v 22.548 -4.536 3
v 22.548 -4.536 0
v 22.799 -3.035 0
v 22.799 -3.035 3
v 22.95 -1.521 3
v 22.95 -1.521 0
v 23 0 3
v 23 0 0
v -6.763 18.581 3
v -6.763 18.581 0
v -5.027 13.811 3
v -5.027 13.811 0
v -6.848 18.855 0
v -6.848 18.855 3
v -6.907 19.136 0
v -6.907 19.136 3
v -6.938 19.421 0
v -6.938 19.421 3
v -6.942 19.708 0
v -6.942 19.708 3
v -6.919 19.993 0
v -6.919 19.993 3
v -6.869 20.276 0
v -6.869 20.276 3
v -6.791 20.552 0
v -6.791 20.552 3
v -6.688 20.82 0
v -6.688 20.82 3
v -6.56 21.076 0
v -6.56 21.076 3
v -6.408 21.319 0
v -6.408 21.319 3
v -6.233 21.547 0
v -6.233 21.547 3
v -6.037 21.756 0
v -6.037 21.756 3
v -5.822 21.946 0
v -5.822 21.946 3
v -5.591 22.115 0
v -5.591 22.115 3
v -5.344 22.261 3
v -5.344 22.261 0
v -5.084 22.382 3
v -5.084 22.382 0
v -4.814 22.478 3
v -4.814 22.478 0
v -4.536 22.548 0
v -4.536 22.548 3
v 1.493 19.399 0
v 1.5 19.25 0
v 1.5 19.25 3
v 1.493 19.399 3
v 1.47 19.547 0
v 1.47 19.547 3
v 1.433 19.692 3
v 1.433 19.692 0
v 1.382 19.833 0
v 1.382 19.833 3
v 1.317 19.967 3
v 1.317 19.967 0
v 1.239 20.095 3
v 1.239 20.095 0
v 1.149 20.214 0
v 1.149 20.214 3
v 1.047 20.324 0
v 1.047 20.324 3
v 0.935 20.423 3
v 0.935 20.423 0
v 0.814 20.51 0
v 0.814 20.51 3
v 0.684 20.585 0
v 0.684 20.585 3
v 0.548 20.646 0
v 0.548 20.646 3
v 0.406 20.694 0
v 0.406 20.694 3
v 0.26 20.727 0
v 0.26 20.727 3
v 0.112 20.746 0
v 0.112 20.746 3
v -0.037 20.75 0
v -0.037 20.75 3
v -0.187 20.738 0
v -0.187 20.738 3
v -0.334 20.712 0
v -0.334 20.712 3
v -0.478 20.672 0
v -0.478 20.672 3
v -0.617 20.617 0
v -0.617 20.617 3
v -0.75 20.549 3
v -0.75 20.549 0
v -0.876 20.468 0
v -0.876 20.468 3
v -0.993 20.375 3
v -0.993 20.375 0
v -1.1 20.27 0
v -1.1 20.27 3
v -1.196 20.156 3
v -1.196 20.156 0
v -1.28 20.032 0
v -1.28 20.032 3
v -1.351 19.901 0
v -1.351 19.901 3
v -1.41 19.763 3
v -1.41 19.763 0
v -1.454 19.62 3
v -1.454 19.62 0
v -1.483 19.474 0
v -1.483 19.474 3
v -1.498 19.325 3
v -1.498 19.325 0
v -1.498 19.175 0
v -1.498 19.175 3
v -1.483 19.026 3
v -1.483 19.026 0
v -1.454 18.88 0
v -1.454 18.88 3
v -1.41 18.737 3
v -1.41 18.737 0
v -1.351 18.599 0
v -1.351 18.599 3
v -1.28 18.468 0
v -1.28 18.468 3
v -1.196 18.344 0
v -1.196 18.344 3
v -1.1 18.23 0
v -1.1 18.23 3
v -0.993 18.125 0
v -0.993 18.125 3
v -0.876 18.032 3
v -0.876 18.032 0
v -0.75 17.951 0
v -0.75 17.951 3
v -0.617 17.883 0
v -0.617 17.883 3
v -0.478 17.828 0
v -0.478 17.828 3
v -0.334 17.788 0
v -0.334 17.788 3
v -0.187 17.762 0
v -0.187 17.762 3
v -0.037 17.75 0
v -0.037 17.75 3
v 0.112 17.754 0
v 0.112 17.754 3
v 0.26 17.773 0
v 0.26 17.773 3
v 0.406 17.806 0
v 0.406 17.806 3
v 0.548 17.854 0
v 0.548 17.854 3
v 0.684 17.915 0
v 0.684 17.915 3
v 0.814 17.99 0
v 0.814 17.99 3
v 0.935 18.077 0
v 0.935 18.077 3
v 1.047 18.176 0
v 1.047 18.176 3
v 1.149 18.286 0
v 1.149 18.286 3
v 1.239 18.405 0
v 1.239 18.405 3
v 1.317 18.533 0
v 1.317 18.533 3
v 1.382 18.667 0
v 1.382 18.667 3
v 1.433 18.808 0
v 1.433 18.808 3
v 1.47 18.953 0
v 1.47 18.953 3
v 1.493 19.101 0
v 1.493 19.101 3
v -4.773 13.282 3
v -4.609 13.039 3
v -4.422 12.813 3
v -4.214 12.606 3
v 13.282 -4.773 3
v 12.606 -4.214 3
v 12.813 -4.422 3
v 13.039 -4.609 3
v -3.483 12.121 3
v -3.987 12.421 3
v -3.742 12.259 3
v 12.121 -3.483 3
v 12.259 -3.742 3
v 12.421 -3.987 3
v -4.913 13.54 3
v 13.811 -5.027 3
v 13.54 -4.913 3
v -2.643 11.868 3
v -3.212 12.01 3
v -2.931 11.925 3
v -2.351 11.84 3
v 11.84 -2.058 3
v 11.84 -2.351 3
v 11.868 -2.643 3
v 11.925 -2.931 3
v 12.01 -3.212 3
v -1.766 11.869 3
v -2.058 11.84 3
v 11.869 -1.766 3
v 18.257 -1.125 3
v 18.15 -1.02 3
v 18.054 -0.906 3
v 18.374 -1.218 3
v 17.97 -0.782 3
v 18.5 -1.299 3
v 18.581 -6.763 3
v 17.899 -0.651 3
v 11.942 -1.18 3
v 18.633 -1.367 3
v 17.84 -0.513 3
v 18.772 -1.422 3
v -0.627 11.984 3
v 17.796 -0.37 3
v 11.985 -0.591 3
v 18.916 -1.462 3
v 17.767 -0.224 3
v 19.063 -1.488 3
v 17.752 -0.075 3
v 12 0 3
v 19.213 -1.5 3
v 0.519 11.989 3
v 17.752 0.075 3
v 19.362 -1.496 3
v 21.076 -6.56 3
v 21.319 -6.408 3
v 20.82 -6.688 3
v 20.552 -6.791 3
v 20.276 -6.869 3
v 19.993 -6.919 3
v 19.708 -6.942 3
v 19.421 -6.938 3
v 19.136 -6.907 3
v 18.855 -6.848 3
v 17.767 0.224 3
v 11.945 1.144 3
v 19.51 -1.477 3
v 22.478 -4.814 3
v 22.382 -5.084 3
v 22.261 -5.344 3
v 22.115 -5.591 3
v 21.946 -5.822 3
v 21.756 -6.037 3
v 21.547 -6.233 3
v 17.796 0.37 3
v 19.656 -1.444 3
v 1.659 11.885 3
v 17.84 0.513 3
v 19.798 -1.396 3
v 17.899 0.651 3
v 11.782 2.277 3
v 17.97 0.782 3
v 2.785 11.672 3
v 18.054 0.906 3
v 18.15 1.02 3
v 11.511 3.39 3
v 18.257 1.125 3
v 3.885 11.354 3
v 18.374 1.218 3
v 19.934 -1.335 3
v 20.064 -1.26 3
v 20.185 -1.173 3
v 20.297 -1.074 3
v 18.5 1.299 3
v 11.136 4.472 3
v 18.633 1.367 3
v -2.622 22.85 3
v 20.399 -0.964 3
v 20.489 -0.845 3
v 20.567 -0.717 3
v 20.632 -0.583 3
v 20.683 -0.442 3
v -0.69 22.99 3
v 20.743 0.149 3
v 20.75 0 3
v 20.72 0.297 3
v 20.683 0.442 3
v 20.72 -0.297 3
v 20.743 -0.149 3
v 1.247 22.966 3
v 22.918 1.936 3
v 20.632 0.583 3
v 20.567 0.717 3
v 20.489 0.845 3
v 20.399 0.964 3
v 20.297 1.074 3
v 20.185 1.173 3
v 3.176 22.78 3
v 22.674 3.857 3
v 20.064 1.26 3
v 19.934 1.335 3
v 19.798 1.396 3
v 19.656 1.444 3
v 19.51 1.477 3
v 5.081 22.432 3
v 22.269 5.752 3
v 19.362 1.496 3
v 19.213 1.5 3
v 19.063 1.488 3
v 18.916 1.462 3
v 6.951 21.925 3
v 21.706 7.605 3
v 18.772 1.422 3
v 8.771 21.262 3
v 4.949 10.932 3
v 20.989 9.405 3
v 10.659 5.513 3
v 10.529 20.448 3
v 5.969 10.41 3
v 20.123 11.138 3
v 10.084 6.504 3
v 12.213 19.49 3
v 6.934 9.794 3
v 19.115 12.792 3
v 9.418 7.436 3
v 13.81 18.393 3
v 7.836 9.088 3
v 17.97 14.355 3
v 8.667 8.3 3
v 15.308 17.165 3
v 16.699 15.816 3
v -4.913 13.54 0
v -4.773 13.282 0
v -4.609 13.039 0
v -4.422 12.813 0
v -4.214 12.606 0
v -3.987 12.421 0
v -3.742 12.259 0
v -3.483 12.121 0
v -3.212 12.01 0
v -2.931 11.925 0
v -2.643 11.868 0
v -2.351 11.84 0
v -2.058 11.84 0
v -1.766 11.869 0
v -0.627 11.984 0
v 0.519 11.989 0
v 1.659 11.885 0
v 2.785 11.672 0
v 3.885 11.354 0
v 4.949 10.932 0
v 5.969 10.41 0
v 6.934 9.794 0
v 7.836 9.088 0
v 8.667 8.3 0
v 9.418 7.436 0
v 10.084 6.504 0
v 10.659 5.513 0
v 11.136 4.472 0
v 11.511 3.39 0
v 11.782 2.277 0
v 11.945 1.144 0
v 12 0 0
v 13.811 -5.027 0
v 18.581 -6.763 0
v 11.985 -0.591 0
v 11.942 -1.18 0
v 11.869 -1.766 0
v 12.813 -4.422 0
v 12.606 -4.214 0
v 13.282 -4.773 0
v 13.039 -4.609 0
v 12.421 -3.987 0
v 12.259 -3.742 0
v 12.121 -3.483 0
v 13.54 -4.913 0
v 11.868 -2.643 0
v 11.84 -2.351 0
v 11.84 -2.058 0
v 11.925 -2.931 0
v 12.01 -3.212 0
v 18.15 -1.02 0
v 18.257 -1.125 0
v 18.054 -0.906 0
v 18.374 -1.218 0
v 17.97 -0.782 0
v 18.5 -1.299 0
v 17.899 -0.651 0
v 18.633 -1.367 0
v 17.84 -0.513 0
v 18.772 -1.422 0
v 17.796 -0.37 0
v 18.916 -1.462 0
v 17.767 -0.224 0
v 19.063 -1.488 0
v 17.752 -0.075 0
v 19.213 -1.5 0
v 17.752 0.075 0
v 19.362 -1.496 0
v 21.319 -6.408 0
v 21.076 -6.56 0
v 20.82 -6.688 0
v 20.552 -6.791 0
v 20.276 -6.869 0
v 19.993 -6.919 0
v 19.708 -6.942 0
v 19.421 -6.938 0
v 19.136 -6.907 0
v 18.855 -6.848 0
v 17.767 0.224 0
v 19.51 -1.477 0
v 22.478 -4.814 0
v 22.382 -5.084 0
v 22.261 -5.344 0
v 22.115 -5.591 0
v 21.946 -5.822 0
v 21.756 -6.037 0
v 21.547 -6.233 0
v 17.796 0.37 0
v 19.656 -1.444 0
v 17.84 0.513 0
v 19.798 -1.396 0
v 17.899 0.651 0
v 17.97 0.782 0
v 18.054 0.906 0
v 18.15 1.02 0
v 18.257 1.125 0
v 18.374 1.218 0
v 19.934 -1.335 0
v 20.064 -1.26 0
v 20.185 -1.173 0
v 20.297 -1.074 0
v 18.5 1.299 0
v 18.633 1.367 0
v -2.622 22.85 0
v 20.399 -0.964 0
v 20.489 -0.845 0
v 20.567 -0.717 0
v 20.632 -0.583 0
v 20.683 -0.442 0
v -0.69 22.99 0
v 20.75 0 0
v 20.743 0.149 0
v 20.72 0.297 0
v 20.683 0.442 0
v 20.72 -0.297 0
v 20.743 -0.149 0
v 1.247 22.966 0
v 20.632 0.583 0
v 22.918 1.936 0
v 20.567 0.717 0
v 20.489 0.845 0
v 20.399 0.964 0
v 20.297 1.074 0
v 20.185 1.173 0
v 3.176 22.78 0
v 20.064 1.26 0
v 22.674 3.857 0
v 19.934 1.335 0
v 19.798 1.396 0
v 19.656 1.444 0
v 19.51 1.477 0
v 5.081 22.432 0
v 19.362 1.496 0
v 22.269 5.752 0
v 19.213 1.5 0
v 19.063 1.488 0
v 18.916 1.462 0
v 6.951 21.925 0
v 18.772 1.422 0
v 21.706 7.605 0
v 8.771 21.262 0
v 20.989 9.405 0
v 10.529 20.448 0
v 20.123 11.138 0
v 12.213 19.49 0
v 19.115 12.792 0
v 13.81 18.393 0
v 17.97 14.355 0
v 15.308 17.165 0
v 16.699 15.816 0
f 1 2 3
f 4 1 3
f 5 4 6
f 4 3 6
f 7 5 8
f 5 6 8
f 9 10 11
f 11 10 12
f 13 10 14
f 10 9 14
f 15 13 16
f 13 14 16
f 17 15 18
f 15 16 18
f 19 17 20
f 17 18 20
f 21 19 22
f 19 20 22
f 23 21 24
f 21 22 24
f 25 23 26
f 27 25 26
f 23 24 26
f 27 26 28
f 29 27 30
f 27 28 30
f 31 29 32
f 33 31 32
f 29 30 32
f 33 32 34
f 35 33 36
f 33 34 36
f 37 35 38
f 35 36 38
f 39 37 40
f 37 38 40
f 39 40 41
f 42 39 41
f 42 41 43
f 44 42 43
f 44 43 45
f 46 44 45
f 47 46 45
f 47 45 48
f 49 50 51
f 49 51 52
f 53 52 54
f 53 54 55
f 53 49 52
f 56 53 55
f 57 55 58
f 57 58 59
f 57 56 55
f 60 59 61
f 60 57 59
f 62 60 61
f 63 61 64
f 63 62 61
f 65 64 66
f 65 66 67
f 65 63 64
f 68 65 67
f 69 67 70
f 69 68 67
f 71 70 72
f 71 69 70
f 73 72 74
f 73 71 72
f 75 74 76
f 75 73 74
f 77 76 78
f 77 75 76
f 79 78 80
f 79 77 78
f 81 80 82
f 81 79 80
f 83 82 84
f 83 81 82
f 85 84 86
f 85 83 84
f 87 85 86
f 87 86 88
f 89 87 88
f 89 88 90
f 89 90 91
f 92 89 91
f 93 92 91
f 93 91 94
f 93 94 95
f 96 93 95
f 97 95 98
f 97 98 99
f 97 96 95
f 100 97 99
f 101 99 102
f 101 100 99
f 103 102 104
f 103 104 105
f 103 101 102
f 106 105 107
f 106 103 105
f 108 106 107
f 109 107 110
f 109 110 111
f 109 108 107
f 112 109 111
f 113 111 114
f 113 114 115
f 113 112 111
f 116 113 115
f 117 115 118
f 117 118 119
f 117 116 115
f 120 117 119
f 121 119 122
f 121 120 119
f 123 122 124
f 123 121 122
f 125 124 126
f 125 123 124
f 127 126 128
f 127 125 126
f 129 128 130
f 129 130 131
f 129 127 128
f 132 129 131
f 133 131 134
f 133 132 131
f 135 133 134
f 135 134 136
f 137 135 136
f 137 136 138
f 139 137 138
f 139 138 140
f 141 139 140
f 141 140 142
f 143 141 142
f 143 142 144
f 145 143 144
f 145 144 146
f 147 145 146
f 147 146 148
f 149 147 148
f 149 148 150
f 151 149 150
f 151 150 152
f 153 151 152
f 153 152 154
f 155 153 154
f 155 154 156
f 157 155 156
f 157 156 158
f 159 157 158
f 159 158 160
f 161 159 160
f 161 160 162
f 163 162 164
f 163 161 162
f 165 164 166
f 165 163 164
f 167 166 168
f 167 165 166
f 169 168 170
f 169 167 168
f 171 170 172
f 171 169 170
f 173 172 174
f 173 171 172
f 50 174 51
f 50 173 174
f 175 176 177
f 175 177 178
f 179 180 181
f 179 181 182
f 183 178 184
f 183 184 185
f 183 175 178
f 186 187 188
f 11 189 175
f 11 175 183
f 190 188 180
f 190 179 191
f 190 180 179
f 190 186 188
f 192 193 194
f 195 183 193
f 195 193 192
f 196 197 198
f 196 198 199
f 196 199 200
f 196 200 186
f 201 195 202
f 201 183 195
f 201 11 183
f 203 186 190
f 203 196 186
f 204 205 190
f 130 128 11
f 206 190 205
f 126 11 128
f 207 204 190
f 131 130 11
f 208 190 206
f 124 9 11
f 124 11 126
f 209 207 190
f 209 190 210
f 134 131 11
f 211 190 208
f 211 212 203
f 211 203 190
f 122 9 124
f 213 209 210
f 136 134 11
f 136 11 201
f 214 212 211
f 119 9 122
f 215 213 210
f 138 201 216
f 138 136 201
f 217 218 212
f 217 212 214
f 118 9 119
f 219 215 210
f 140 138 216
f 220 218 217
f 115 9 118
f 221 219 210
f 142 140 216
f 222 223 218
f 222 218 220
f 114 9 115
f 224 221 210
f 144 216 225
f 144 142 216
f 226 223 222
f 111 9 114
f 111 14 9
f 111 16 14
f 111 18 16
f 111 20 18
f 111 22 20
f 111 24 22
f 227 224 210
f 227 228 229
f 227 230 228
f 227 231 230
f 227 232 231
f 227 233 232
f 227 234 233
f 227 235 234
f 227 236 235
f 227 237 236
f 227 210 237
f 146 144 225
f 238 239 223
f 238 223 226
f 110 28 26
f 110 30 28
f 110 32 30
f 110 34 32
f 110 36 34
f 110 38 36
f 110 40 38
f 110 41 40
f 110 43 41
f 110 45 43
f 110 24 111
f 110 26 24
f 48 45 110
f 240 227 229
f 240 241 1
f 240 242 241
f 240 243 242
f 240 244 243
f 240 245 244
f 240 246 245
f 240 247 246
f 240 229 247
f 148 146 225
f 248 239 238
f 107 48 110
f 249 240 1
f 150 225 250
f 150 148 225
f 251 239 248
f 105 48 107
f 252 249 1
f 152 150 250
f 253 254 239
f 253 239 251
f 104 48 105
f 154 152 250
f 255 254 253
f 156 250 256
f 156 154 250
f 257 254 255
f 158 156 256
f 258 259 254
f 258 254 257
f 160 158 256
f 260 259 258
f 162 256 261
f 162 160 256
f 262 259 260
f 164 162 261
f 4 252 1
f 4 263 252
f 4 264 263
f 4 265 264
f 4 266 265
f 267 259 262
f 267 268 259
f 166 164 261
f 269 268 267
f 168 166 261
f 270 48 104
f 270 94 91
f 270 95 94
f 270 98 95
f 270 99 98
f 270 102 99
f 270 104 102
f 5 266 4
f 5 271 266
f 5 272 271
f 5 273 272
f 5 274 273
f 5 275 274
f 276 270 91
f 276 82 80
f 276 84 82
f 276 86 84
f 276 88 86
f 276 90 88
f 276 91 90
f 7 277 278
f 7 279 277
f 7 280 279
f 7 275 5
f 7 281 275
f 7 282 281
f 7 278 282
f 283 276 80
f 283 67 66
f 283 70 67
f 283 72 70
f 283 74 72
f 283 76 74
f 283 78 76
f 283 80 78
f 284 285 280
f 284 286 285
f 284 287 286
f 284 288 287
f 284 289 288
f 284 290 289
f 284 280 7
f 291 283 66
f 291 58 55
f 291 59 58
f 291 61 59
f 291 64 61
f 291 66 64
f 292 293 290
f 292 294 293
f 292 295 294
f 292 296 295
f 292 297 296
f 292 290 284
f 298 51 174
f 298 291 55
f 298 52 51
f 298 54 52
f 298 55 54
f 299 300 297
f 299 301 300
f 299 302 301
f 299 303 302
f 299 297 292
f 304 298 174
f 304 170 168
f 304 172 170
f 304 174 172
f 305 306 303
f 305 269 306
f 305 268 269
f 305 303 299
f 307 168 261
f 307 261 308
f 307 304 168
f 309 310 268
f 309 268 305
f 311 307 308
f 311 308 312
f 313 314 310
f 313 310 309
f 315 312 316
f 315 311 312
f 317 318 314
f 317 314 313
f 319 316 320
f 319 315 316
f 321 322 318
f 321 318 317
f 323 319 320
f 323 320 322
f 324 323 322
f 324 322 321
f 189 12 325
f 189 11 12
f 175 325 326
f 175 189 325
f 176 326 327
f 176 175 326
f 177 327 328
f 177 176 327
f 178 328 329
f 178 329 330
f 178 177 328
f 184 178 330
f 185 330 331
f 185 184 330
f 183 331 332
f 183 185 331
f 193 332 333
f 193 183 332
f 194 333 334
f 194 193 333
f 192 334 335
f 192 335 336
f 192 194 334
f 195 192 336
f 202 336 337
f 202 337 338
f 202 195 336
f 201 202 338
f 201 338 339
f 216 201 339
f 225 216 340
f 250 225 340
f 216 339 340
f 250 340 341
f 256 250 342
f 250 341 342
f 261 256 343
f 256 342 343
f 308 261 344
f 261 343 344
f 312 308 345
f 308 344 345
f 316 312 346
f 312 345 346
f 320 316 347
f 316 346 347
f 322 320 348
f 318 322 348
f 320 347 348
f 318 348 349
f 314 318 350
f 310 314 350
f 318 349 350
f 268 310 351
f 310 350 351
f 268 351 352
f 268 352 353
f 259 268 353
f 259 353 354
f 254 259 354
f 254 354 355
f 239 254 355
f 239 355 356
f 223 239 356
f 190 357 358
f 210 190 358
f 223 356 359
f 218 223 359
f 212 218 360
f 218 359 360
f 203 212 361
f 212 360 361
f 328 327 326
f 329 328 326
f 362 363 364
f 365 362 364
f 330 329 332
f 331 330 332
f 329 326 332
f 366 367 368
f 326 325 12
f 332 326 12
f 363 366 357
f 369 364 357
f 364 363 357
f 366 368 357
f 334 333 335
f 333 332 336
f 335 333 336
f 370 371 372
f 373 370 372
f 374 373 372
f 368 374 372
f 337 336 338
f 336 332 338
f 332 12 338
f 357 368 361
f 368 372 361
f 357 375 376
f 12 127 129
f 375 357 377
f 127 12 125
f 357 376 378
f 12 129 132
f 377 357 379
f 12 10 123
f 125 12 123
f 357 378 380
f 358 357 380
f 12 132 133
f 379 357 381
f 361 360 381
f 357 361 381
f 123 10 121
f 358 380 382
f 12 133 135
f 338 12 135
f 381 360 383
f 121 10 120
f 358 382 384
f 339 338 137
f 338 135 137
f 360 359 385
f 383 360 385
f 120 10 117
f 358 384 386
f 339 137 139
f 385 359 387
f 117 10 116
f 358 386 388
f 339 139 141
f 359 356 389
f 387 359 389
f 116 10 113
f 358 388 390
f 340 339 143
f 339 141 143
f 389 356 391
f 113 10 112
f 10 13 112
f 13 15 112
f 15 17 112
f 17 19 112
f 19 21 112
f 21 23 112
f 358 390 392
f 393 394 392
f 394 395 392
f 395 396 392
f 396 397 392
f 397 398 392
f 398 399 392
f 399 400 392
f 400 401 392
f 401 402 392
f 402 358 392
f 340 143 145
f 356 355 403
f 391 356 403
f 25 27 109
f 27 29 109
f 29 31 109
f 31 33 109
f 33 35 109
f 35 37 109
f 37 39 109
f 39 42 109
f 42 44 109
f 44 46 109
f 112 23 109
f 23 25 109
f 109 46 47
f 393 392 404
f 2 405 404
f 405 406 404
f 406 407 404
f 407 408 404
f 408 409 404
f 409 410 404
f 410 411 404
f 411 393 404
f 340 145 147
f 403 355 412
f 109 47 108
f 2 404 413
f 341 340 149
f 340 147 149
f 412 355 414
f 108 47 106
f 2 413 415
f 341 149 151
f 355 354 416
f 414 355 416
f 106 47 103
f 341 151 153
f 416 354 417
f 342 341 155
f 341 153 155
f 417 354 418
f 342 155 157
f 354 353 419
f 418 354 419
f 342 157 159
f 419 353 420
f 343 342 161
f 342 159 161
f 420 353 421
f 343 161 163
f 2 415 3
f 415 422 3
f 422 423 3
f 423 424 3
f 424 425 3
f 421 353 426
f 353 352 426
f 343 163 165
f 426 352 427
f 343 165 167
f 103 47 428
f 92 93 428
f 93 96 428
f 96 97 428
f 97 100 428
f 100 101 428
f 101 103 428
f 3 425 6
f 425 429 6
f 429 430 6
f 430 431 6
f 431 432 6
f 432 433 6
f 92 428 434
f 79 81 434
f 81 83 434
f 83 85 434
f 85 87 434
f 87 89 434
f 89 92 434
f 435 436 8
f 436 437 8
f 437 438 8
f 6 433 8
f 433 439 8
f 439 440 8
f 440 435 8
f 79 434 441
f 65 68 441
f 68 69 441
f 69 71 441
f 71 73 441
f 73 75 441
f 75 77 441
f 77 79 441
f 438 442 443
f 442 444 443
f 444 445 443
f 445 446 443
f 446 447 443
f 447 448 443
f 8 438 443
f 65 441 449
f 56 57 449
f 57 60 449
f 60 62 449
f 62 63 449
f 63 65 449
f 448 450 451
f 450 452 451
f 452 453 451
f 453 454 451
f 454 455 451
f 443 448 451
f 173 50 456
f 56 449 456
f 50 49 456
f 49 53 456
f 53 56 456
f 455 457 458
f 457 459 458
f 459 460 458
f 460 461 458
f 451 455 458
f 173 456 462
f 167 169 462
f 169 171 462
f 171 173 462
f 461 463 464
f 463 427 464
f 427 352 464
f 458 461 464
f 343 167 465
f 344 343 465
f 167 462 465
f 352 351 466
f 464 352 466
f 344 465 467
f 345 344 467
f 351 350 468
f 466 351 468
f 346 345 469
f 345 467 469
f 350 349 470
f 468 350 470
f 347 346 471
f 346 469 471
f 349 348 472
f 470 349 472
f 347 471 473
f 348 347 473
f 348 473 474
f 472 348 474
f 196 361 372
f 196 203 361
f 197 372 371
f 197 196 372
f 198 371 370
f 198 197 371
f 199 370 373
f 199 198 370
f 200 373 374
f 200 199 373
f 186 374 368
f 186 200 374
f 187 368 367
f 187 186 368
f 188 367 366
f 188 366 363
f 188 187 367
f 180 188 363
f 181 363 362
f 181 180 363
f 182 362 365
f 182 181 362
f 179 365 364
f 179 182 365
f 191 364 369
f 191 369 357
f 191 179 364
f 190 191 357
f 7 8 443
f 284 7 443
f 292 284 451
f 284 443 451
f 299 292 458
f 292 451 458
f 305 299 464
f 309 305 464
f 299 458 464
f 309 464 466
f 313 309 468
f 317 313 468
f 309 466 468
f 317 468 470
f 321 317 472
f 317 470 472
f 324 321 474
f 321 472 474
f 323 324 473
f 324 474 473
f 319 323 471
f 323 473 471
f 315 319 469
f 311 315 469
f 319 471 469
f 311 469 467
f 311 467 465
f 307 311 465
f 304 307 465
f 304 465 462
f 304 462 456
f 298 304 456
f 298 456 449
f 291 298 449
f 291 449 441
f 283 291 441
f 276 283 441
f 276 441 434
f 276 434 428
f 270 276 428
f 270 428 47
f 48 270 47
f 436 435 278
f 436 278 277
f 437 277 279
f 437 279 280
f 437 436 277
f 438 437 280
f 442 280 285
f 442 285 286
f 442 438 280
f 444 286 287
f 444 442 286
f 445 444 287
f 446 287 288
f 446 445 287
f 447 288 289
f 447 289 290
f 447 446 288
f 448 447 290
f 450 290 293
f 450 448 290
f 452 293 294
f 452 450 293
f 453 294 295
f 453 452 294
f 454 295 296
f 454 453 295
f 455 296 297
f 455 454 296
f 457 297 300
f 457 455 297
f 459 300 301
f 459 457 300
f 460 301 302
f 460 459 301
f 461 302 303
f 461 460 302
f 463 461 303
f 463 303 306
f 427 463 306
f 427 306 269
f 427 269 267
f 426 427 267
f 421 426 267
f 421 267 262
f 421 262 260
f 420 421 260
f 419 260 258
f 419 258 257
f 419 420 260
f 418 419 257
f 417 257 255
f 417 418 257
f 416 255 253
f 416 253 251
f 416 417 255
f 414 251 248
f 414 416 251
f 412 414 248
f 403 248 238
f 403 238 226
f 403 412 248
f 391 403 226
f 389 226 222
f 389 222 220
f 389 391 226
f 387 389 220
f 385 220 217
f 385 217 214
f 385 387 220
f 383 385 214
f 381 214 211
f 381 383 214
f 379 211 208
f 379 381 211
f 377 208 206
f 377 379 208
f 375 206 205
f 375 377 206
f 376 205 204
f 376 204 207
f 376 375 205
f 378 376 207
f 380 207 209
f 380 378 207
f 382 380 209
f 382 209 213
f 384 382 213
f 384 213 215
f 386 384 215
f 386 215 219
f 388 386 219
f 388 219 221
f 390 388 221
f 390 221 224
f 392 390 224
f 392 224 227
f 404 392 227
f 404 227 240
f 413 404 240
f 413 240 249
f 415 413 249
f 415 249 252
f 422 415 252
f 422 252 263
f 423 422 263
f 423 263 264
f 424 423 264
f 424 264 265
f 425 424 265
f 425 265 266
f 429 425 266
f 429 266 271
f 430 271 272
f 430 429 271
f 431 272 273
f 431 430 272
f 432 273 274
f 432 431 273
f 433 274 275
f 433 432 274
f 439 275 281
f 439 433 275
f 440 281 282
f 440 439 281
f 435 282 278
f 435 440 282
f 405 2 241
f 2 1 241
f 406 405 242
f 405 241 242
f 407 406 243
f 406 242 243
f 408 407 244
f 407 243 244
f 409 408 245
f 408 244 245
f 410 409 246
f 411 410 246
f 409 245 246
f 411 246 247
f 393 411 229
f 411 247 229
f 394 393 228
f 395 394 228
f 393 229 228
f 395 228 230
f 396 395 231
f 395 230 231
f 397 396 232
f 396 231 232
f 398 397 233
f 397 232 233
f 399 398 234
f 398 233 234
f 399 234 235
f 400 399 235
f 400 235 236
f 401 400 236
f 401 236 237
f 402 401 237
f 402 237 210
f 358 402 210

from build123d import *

# Parameters (mm, degrees)
SKETCH_1_R      = 1.5
EXTRUDE_1_DEPTH = 3
FILLET_1_R      = 3


with BuildPart() as part:
    # 草图1 → 凸台-拉伸1 (new body)
    with BuildSketch(Plane.XY):
        with BuildLine():
            Line((-7.866463296, 21.612930278), (-4.10424172, 11.276311449))
            ThreePointArc((-4.10424172, 11.276311449), (6.882917236, 9.829824531), (12, 0))
            ThreePointArc((12, 0), (11.817693036, -2.083778132), (11.276311449, -4.10424172))
            Line((11.276311449, -4.10424172), (21.612930278, -7.866463296))
            ThreePointArc((21.612930278, -7.866463296), (22.650578319, -3.993908086), (23, 0))
            ThreePointArc((23, 0), (13.192258036, 18.840497019), (-7.866463296, 21.612930278))
        make_face()
        with Locations((19.25, 0)):
            Circle(SKETCH_1_R, mode=Mode.SUBTRACT)
        with Locations((0, 19.25)):
            Circle(SKETCH_1_R, mode=Mode.SUBTRACT)
    extrude(amount=EXTRUDE_1_DEPTH)

    # 圆角1
    fillet_1_edges = [part.edges().sort_by_distance(p)[0] for p in [
        (11.276311449, -4.10424172, 1.5),
        (-4.10424172, 11.276311449, 1.5),
        (-7.866463296, 21.612930278, 1.5),
        (21.612930278, -7.866463296, 1.5),
    ]]
    fillet(fillet_1_edges, radius=FILLET_1_R)


solid = part.part
